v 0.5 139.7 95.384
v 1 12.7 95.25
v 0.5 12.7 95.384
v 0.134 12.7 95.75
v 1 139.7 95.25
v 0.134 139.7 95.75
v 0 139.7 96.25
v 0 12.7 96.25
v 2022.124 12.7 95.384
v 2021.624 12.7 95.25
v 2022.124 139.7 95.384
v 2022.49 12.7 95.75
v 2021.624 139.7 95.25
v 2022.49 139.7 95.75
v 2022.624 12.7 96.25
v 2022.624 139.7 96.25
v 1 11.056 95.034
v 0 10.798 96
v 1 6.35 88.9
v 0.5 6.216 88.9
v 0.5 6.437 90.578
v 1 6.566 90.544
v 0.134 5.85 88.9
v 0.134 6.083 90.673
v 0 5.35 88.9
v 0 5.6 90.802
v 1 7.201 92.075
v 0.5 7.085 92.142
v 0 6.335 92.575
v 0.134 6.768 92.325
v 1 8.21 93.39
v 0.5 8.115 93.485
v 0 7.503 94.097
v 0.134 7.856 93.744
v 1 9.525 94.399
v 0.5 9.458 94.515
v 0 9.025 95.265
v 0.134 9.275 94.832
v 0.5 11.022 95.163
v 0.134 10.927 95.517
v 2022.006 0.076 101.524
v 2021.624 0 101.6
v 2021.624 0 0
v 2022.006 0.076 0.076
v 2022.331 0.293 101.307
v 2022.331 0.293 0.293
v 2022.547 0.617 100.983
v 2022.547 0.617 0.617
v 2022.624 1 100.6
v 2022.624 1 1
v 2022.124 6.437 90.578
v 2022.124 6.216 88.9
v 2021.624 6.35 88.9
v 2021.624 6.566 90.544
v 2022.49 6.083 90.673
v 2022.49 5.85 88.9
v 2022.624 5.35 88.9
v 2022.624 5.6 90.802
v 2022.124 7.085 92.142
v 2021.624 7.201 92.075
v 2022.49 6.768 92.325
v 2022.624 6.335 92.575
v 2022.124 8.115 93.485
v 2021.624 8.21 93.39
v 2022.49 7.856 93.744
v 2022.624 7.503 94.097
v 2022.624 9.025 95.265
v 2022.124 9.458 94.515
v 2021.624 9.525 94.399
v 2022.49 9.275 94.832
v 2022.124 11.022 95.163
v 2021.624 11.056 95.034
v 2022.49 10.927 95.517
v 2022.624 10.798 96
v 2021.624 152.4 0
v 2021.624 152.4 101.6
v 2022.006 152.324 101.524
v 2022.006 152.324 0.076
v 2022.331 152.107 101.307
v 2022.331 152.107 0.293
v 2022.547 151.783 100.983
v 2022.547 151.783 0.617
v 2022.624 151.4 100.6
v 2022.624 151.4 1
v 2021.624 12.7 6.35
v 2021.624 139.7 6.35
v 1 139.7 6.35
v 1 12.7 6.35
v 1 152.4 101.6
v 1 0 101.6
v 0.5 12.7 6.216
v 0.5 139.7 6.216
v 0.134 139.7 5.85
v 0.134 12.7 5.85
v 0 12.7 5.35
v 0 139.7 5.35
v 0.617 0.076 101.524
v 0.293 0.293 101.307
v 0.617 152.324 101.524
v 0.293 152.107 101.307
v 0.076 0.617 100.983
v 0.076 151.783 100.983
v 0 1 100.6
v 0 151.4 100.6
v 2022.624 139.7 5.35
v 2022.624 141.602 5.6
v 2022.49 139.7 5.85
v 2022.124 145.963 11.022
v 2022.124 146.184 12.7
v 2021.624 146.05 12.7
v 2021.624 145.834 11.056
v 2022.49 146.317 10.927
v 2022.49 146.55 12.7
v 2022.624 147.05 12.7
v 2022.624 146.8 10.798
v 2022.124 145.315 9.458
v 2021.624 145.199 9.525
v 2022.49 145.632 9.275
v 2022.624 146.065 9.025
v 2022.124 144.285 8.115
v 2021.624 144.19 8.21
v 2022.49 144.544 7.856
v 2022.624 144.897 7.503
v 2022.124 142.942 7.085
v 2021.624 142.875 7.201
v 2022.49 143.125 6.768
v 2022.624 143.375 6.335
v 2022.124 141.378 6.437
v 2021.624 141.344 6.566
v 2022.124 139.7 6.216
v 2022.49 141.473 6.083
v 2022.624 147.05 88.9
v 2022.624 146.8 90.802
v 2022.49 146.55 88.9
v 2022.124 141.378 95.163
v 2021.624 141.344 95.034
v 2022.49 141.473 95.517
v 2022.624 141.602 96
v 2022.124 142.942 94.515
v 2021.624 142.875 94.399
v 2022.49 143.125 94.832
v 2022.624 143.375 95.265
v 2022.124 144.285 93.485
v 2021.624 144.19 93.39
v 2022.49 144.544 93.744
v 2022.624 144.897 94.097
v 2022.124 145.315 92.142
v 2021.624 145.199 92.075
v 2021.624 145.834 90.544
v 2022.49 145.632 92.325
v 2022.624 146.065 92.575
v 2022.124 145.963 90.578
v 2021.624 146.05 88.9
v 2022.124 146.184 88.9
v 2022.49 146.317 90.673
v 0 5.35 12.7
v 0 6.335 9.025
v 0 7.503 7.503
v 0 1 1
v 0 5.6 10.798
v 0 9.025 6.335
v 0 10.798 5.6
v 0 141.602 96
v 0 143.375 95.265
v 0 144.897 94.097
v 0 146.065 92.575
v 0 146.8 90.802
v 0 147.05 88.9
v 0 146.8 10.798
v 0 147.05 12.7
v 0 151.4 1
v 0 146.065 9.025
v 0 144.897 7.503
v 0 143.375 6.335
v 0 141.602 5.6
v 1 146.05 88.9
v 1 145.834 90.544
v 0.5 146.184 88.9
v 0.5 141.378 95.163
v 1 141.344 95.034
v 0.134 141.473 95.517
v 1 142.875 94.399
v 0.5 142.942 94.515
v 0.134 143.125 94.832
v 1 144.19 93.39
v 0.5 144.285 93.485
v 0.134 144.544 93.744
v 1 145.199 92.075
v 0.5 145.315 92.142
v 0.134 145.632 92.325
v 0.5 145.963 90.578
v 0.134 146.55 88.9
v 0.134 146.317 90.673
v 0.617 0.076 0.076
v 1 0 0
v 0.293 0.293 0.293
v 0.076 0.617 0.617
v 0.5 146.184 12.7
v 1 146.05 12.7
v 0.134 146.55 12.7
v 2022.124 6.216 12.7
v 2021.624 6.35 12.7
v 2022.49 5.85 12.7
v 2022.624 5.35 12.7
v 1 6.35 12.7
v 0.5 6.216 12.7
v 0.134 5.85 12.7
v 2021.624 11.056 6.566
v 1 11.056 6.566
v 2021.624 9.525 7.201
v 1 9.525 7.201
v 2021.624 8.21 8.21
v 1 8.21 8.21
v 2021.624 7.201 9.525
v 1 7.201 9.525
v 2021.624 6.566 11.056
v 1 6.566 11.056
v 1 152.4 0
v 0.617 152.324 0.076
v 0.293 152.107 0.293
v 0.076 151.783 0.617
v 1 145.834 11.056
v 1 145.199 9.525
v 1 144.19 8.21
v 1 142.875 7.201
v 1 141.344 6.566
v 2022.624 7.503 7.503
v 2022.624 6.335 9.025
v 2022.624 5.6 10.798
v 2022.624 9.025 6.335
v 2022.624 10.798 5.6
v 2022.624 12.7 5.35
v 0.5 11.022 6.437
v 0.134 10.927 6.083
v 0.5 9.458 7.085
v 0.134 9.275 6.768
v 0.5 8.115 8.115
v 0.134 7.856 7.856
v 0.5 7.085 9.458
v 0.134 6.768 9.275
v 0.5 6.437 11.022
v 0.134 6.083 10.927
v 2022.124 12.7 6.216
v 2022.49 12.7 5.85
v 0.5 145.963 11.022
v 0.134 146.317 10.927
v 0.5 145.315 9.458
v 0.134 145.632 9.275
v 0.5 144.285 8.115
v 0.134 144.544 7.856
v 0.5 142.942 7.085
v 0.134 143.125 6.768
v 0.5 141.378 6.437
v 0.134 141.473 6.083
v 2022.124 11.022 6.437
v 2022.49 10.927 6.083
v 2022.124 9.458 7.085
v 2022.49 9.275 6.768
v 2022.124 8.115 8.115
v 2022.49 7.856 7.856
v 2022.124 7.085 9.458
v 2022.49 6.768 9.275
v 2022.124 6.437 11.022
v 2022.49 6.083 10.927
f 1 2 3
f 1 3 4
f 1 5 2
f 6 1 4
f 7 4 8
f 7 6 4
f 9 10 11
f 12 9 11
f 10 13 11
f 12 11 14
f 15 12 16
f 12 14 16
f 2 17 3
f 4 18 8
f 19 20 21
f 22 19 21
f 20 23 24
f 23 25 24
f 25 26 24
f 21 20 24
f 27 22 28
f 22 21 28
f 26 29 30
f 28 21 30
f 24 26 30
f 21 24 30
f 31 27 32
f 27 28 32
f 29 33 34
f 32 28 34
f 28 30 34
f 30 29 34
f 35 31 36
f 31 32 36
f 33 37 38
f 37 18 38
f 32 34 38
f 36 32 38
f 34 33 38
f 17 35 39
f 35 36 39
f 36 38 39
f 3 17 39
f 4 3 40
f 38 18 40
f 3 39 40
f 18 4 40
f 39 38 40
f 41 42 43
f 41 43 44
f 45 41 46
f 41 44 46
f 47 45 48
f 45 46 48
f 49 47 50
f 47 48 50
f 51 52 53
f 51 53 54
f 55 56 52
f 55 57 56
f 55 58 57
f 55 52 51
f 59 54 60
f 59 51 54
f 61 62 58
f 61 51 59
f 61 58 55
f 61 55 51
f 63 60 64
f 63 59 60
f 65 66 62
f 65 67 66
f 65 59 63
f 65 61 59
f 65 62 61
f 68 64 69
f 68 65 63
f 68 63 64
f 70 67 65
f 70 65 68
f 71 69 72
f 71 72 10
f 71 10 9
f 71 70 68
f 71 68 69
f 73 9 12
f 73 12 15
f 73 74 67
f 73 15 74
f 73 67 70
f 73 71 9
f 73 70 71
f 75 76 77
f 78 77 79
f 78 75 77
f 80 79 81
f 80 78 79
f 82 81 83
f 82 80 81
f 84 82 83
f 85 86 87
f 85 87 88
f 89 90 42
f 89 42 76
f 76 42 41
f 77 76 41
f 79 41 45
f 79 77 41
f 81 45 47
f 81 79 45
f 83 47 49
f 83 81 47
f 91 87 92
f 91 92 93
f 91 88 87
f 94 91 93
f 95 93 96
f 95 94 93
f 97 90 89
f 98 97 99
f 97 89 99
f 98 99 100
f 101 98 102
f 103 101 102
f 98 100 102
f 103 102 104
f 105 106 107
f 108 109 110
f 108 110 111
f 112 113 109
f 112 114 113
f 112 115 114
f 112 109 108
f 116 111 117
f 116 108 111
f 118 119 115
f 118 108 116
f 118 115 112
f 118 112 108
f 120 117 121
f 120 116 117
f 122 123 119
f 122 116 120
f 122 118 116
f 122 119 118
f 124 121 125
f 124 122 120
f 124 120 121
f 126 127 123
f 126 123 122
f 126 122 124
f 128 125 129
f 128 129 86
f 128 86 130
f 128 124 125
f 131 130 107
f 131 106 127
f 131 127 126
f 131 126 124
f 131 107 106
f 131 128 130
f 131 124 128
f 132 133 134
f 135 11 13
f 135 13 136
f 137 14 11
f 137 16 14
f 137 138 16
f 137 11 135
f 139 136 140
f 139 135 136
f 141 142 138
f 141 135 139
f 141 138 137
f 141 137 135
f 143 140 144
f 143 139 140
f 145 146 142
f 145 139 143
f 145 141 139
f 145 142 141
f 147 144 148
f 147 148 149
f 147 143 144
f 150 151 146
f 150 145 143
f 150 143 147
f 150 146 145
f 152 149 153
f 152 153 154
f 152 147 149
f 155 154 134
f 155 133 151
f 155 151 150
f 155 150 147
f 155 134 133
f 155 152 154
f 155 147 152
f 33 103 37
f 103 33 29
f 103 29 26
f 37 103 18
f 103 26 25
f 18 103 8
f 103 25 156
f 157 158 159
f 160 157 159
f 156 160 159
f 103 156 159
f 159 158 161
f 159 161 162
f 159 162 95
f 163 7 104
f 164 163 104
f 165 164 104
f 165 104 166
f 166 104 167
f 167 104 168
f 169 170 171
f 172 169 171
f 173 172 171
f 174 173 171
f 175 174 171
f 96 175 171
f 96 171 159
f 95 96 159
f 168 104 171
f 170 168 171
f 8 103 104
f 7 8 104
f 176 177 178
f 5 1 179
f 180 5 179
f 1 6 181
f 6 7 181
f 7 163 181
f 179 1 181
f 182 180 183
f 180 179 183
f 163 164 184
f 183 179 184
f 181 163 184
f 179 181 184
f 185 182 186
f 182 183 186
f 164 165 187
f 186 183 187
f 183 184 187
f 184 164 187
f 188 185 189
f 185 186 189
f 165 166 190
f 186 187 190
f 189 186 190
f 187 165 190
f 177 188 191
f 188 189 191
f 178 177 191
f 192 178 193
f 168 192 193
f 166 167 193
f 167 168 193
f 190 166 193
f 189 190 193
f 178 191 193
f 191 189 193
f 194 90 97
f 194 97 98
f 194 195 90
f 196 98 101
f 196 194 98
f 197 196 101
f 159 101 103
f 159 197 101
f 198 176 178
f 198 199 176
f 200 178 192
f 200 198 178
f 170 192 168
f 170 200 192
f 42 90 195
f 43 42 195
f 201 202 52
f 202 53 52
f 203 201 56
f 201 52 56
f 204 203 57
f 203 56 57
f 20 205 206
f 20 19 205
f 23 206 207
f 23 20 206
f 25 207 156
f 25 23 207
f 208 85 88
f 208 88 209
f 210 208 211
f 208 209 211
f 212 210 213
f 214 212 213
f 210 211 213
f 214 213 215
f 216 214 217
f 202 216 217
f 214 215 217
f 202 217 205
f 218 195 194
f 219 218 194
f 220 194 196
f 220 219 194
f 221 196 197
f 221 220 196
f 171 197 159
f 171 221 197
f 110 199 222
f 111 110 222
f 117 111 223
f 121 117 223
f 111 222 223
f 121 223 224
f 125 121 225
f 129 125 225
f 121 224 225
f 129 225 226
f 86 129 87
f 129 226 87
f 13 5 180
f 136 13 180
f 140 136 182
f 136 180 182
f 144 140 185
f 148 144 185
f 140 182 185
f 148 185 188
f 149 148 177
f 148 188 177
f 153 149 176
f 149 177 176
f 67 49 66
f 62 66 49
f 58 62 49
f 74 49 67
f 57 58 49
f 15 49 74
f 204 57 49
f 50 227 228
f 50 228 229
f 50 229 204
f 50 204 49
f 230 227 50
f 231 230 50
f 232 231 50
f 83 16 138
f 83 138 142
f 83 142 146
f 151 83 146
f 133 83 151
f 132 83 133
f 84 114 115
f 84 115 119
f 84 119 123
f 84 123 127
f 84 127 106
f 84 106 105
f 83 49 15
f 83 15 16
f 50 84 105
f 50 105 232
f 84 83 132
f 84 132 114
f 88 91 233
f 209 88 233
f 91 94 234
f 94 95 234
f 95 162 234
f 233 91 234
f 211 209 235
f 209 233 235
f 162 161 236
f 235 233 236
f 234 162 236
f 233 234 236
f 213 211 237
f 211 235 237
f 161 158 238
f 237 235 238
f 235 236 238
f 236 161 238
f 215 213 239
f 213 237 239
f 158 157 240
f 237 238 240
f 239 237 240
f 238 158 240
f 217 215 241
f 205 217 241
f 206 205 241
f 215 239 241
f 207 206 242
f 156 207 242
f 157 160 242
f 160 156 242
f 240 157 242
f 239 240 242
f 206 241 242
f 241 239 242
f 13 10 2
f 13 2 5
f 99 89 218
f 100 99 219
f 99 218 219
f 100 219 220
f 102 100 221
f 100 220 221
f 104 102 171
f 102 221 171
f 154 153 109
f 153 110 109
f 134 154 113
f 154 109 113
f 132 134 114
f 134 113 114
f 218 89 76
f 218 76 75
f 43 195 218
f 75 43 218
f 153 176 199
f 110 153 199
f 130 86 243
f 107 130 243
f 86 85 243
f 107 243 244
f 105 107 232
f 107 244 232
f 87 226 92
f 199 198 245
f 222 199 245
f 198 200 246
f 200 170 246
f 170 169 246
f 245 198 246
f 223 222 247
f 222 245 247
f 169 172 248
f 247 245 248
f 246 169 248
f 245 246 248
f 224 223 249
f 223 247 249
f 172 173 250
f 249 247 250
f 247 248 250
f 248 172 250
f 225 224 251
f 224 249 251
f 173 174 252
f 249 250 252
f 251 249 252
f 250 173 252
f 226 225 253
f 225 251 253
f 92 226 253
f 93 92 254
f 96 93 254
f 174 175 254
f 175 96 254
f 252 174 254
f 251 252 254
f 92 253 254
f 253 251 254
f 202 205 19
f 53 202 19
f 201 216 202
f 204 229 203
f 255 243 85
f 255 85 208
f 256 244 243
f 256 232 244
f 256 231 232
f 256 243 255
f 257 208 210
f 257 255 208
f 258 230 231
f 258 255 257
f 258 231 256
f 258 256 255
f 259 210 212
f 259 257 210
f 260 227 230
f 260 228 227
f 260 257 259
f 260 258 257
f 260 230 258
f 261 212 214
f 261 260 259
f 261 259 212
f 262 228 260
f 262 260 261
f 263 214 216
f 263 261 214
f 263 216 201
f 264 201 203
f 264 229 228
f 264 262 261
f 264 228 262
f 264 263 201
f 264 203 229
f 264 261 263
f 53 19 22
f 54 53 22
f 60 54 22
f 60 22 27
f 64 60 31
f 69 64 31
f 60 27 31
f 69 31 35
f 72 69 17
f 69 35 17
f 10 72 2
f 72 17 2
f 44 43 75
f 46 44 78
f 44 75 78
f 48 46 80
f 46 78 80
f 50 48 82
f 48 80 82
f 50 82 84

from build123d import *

# Parameters (mm, degrees)
SKETCH1_W           = 101.6
SKETCH1_H           = 152.4
BOSS_EXTRUDE1_DEPTH = 2022.623564854
FILLET1_R           = 1


with BuildPart() as part:
    # Sketch1 → Boss-Extrude1 (new body)
    with BuildSketch(Plane(origin=(0, 0, 0), x_dir=(0, 0, -1), z_dir=(1, 0, 0))):
        with Locations((-50.8, 76.2)):
            Rectangle(SKETCH1_W, SKETCH1_H)
        with BuildLine():
            Line((-95.25, 12.7), (-95.25, 139.7))
            ThreePointArc((-95.25, 139.7), (-93.390128061, 144.190128061), (-88.9, 146.05))
            Line((-88.9, 146.05), (-12.7, 146.05))
            ThreePointArc((-12.7, 146.05), (-8.209871939, 144.190128061), (-6.35, 139.7))
            Line((-6.35, 139.7), (-6.35, 12.7))
            ThreePointArc((-6.35, 12.7), (-8.209871939, 8.209871939), (-12.7, 6.35))
            Line((-12.7, 6.35), (-88.9, 6.35))
            ThreePointArc((-88.9, 6.35), (-93.390128061, 8.209871939), (-95.25, 12.7))
        make_face(mode=Mode.SUBTRACT)
    extrude(amount=BOSS_EXTRUDE1_DEPTH)

    # Fillet1
    fillet1_edges = [part.edges().sort_by_distance(p)[0] for p in [
        (2022.623564854, 76.2, 101.6),
        (2022.623564854, 0, 50.8),
        (0, 8.209871939, 93.390128061),
        (0, 6.35, 50.8),
        (0, 8.209871939, 8.209871939),
        (0, 76.2, 6.35),
        (0, 144.190128061, 8.209871939),
        (0, 146.05, 50.8),
        (0, 144.190128061, 93.390128061),
        (0, 76.2, 95.25),
        (2022.623564854, 8.209871939, 93.390128061),
        (2022.623564854, 6.35, 50.8),
        (2022.623564854, 8.209871939, 8.209871939),
        (2022.623564854, 76.2, 6.35),
        (2022.623564854, 144.190128061, 8.209871939),
        (2022.623564854, 146.05, 50.8),
        (2022.623564854, 144.190128061, 93.390128061),
        (2022.623564854, 76.2, 95.25),
        (2022.623564854, 76.2, 0),
        (0, 0, 50.8),
        (0, 76.2, 101.6),
        (0, 152.4, 50.8),
        (0, 76.2, 0),
        (2022.623564854, 152.4, 50.8),
    ]]
    fillet(fillet1_edges, radius=FILLET1_R)


solid = part.part
